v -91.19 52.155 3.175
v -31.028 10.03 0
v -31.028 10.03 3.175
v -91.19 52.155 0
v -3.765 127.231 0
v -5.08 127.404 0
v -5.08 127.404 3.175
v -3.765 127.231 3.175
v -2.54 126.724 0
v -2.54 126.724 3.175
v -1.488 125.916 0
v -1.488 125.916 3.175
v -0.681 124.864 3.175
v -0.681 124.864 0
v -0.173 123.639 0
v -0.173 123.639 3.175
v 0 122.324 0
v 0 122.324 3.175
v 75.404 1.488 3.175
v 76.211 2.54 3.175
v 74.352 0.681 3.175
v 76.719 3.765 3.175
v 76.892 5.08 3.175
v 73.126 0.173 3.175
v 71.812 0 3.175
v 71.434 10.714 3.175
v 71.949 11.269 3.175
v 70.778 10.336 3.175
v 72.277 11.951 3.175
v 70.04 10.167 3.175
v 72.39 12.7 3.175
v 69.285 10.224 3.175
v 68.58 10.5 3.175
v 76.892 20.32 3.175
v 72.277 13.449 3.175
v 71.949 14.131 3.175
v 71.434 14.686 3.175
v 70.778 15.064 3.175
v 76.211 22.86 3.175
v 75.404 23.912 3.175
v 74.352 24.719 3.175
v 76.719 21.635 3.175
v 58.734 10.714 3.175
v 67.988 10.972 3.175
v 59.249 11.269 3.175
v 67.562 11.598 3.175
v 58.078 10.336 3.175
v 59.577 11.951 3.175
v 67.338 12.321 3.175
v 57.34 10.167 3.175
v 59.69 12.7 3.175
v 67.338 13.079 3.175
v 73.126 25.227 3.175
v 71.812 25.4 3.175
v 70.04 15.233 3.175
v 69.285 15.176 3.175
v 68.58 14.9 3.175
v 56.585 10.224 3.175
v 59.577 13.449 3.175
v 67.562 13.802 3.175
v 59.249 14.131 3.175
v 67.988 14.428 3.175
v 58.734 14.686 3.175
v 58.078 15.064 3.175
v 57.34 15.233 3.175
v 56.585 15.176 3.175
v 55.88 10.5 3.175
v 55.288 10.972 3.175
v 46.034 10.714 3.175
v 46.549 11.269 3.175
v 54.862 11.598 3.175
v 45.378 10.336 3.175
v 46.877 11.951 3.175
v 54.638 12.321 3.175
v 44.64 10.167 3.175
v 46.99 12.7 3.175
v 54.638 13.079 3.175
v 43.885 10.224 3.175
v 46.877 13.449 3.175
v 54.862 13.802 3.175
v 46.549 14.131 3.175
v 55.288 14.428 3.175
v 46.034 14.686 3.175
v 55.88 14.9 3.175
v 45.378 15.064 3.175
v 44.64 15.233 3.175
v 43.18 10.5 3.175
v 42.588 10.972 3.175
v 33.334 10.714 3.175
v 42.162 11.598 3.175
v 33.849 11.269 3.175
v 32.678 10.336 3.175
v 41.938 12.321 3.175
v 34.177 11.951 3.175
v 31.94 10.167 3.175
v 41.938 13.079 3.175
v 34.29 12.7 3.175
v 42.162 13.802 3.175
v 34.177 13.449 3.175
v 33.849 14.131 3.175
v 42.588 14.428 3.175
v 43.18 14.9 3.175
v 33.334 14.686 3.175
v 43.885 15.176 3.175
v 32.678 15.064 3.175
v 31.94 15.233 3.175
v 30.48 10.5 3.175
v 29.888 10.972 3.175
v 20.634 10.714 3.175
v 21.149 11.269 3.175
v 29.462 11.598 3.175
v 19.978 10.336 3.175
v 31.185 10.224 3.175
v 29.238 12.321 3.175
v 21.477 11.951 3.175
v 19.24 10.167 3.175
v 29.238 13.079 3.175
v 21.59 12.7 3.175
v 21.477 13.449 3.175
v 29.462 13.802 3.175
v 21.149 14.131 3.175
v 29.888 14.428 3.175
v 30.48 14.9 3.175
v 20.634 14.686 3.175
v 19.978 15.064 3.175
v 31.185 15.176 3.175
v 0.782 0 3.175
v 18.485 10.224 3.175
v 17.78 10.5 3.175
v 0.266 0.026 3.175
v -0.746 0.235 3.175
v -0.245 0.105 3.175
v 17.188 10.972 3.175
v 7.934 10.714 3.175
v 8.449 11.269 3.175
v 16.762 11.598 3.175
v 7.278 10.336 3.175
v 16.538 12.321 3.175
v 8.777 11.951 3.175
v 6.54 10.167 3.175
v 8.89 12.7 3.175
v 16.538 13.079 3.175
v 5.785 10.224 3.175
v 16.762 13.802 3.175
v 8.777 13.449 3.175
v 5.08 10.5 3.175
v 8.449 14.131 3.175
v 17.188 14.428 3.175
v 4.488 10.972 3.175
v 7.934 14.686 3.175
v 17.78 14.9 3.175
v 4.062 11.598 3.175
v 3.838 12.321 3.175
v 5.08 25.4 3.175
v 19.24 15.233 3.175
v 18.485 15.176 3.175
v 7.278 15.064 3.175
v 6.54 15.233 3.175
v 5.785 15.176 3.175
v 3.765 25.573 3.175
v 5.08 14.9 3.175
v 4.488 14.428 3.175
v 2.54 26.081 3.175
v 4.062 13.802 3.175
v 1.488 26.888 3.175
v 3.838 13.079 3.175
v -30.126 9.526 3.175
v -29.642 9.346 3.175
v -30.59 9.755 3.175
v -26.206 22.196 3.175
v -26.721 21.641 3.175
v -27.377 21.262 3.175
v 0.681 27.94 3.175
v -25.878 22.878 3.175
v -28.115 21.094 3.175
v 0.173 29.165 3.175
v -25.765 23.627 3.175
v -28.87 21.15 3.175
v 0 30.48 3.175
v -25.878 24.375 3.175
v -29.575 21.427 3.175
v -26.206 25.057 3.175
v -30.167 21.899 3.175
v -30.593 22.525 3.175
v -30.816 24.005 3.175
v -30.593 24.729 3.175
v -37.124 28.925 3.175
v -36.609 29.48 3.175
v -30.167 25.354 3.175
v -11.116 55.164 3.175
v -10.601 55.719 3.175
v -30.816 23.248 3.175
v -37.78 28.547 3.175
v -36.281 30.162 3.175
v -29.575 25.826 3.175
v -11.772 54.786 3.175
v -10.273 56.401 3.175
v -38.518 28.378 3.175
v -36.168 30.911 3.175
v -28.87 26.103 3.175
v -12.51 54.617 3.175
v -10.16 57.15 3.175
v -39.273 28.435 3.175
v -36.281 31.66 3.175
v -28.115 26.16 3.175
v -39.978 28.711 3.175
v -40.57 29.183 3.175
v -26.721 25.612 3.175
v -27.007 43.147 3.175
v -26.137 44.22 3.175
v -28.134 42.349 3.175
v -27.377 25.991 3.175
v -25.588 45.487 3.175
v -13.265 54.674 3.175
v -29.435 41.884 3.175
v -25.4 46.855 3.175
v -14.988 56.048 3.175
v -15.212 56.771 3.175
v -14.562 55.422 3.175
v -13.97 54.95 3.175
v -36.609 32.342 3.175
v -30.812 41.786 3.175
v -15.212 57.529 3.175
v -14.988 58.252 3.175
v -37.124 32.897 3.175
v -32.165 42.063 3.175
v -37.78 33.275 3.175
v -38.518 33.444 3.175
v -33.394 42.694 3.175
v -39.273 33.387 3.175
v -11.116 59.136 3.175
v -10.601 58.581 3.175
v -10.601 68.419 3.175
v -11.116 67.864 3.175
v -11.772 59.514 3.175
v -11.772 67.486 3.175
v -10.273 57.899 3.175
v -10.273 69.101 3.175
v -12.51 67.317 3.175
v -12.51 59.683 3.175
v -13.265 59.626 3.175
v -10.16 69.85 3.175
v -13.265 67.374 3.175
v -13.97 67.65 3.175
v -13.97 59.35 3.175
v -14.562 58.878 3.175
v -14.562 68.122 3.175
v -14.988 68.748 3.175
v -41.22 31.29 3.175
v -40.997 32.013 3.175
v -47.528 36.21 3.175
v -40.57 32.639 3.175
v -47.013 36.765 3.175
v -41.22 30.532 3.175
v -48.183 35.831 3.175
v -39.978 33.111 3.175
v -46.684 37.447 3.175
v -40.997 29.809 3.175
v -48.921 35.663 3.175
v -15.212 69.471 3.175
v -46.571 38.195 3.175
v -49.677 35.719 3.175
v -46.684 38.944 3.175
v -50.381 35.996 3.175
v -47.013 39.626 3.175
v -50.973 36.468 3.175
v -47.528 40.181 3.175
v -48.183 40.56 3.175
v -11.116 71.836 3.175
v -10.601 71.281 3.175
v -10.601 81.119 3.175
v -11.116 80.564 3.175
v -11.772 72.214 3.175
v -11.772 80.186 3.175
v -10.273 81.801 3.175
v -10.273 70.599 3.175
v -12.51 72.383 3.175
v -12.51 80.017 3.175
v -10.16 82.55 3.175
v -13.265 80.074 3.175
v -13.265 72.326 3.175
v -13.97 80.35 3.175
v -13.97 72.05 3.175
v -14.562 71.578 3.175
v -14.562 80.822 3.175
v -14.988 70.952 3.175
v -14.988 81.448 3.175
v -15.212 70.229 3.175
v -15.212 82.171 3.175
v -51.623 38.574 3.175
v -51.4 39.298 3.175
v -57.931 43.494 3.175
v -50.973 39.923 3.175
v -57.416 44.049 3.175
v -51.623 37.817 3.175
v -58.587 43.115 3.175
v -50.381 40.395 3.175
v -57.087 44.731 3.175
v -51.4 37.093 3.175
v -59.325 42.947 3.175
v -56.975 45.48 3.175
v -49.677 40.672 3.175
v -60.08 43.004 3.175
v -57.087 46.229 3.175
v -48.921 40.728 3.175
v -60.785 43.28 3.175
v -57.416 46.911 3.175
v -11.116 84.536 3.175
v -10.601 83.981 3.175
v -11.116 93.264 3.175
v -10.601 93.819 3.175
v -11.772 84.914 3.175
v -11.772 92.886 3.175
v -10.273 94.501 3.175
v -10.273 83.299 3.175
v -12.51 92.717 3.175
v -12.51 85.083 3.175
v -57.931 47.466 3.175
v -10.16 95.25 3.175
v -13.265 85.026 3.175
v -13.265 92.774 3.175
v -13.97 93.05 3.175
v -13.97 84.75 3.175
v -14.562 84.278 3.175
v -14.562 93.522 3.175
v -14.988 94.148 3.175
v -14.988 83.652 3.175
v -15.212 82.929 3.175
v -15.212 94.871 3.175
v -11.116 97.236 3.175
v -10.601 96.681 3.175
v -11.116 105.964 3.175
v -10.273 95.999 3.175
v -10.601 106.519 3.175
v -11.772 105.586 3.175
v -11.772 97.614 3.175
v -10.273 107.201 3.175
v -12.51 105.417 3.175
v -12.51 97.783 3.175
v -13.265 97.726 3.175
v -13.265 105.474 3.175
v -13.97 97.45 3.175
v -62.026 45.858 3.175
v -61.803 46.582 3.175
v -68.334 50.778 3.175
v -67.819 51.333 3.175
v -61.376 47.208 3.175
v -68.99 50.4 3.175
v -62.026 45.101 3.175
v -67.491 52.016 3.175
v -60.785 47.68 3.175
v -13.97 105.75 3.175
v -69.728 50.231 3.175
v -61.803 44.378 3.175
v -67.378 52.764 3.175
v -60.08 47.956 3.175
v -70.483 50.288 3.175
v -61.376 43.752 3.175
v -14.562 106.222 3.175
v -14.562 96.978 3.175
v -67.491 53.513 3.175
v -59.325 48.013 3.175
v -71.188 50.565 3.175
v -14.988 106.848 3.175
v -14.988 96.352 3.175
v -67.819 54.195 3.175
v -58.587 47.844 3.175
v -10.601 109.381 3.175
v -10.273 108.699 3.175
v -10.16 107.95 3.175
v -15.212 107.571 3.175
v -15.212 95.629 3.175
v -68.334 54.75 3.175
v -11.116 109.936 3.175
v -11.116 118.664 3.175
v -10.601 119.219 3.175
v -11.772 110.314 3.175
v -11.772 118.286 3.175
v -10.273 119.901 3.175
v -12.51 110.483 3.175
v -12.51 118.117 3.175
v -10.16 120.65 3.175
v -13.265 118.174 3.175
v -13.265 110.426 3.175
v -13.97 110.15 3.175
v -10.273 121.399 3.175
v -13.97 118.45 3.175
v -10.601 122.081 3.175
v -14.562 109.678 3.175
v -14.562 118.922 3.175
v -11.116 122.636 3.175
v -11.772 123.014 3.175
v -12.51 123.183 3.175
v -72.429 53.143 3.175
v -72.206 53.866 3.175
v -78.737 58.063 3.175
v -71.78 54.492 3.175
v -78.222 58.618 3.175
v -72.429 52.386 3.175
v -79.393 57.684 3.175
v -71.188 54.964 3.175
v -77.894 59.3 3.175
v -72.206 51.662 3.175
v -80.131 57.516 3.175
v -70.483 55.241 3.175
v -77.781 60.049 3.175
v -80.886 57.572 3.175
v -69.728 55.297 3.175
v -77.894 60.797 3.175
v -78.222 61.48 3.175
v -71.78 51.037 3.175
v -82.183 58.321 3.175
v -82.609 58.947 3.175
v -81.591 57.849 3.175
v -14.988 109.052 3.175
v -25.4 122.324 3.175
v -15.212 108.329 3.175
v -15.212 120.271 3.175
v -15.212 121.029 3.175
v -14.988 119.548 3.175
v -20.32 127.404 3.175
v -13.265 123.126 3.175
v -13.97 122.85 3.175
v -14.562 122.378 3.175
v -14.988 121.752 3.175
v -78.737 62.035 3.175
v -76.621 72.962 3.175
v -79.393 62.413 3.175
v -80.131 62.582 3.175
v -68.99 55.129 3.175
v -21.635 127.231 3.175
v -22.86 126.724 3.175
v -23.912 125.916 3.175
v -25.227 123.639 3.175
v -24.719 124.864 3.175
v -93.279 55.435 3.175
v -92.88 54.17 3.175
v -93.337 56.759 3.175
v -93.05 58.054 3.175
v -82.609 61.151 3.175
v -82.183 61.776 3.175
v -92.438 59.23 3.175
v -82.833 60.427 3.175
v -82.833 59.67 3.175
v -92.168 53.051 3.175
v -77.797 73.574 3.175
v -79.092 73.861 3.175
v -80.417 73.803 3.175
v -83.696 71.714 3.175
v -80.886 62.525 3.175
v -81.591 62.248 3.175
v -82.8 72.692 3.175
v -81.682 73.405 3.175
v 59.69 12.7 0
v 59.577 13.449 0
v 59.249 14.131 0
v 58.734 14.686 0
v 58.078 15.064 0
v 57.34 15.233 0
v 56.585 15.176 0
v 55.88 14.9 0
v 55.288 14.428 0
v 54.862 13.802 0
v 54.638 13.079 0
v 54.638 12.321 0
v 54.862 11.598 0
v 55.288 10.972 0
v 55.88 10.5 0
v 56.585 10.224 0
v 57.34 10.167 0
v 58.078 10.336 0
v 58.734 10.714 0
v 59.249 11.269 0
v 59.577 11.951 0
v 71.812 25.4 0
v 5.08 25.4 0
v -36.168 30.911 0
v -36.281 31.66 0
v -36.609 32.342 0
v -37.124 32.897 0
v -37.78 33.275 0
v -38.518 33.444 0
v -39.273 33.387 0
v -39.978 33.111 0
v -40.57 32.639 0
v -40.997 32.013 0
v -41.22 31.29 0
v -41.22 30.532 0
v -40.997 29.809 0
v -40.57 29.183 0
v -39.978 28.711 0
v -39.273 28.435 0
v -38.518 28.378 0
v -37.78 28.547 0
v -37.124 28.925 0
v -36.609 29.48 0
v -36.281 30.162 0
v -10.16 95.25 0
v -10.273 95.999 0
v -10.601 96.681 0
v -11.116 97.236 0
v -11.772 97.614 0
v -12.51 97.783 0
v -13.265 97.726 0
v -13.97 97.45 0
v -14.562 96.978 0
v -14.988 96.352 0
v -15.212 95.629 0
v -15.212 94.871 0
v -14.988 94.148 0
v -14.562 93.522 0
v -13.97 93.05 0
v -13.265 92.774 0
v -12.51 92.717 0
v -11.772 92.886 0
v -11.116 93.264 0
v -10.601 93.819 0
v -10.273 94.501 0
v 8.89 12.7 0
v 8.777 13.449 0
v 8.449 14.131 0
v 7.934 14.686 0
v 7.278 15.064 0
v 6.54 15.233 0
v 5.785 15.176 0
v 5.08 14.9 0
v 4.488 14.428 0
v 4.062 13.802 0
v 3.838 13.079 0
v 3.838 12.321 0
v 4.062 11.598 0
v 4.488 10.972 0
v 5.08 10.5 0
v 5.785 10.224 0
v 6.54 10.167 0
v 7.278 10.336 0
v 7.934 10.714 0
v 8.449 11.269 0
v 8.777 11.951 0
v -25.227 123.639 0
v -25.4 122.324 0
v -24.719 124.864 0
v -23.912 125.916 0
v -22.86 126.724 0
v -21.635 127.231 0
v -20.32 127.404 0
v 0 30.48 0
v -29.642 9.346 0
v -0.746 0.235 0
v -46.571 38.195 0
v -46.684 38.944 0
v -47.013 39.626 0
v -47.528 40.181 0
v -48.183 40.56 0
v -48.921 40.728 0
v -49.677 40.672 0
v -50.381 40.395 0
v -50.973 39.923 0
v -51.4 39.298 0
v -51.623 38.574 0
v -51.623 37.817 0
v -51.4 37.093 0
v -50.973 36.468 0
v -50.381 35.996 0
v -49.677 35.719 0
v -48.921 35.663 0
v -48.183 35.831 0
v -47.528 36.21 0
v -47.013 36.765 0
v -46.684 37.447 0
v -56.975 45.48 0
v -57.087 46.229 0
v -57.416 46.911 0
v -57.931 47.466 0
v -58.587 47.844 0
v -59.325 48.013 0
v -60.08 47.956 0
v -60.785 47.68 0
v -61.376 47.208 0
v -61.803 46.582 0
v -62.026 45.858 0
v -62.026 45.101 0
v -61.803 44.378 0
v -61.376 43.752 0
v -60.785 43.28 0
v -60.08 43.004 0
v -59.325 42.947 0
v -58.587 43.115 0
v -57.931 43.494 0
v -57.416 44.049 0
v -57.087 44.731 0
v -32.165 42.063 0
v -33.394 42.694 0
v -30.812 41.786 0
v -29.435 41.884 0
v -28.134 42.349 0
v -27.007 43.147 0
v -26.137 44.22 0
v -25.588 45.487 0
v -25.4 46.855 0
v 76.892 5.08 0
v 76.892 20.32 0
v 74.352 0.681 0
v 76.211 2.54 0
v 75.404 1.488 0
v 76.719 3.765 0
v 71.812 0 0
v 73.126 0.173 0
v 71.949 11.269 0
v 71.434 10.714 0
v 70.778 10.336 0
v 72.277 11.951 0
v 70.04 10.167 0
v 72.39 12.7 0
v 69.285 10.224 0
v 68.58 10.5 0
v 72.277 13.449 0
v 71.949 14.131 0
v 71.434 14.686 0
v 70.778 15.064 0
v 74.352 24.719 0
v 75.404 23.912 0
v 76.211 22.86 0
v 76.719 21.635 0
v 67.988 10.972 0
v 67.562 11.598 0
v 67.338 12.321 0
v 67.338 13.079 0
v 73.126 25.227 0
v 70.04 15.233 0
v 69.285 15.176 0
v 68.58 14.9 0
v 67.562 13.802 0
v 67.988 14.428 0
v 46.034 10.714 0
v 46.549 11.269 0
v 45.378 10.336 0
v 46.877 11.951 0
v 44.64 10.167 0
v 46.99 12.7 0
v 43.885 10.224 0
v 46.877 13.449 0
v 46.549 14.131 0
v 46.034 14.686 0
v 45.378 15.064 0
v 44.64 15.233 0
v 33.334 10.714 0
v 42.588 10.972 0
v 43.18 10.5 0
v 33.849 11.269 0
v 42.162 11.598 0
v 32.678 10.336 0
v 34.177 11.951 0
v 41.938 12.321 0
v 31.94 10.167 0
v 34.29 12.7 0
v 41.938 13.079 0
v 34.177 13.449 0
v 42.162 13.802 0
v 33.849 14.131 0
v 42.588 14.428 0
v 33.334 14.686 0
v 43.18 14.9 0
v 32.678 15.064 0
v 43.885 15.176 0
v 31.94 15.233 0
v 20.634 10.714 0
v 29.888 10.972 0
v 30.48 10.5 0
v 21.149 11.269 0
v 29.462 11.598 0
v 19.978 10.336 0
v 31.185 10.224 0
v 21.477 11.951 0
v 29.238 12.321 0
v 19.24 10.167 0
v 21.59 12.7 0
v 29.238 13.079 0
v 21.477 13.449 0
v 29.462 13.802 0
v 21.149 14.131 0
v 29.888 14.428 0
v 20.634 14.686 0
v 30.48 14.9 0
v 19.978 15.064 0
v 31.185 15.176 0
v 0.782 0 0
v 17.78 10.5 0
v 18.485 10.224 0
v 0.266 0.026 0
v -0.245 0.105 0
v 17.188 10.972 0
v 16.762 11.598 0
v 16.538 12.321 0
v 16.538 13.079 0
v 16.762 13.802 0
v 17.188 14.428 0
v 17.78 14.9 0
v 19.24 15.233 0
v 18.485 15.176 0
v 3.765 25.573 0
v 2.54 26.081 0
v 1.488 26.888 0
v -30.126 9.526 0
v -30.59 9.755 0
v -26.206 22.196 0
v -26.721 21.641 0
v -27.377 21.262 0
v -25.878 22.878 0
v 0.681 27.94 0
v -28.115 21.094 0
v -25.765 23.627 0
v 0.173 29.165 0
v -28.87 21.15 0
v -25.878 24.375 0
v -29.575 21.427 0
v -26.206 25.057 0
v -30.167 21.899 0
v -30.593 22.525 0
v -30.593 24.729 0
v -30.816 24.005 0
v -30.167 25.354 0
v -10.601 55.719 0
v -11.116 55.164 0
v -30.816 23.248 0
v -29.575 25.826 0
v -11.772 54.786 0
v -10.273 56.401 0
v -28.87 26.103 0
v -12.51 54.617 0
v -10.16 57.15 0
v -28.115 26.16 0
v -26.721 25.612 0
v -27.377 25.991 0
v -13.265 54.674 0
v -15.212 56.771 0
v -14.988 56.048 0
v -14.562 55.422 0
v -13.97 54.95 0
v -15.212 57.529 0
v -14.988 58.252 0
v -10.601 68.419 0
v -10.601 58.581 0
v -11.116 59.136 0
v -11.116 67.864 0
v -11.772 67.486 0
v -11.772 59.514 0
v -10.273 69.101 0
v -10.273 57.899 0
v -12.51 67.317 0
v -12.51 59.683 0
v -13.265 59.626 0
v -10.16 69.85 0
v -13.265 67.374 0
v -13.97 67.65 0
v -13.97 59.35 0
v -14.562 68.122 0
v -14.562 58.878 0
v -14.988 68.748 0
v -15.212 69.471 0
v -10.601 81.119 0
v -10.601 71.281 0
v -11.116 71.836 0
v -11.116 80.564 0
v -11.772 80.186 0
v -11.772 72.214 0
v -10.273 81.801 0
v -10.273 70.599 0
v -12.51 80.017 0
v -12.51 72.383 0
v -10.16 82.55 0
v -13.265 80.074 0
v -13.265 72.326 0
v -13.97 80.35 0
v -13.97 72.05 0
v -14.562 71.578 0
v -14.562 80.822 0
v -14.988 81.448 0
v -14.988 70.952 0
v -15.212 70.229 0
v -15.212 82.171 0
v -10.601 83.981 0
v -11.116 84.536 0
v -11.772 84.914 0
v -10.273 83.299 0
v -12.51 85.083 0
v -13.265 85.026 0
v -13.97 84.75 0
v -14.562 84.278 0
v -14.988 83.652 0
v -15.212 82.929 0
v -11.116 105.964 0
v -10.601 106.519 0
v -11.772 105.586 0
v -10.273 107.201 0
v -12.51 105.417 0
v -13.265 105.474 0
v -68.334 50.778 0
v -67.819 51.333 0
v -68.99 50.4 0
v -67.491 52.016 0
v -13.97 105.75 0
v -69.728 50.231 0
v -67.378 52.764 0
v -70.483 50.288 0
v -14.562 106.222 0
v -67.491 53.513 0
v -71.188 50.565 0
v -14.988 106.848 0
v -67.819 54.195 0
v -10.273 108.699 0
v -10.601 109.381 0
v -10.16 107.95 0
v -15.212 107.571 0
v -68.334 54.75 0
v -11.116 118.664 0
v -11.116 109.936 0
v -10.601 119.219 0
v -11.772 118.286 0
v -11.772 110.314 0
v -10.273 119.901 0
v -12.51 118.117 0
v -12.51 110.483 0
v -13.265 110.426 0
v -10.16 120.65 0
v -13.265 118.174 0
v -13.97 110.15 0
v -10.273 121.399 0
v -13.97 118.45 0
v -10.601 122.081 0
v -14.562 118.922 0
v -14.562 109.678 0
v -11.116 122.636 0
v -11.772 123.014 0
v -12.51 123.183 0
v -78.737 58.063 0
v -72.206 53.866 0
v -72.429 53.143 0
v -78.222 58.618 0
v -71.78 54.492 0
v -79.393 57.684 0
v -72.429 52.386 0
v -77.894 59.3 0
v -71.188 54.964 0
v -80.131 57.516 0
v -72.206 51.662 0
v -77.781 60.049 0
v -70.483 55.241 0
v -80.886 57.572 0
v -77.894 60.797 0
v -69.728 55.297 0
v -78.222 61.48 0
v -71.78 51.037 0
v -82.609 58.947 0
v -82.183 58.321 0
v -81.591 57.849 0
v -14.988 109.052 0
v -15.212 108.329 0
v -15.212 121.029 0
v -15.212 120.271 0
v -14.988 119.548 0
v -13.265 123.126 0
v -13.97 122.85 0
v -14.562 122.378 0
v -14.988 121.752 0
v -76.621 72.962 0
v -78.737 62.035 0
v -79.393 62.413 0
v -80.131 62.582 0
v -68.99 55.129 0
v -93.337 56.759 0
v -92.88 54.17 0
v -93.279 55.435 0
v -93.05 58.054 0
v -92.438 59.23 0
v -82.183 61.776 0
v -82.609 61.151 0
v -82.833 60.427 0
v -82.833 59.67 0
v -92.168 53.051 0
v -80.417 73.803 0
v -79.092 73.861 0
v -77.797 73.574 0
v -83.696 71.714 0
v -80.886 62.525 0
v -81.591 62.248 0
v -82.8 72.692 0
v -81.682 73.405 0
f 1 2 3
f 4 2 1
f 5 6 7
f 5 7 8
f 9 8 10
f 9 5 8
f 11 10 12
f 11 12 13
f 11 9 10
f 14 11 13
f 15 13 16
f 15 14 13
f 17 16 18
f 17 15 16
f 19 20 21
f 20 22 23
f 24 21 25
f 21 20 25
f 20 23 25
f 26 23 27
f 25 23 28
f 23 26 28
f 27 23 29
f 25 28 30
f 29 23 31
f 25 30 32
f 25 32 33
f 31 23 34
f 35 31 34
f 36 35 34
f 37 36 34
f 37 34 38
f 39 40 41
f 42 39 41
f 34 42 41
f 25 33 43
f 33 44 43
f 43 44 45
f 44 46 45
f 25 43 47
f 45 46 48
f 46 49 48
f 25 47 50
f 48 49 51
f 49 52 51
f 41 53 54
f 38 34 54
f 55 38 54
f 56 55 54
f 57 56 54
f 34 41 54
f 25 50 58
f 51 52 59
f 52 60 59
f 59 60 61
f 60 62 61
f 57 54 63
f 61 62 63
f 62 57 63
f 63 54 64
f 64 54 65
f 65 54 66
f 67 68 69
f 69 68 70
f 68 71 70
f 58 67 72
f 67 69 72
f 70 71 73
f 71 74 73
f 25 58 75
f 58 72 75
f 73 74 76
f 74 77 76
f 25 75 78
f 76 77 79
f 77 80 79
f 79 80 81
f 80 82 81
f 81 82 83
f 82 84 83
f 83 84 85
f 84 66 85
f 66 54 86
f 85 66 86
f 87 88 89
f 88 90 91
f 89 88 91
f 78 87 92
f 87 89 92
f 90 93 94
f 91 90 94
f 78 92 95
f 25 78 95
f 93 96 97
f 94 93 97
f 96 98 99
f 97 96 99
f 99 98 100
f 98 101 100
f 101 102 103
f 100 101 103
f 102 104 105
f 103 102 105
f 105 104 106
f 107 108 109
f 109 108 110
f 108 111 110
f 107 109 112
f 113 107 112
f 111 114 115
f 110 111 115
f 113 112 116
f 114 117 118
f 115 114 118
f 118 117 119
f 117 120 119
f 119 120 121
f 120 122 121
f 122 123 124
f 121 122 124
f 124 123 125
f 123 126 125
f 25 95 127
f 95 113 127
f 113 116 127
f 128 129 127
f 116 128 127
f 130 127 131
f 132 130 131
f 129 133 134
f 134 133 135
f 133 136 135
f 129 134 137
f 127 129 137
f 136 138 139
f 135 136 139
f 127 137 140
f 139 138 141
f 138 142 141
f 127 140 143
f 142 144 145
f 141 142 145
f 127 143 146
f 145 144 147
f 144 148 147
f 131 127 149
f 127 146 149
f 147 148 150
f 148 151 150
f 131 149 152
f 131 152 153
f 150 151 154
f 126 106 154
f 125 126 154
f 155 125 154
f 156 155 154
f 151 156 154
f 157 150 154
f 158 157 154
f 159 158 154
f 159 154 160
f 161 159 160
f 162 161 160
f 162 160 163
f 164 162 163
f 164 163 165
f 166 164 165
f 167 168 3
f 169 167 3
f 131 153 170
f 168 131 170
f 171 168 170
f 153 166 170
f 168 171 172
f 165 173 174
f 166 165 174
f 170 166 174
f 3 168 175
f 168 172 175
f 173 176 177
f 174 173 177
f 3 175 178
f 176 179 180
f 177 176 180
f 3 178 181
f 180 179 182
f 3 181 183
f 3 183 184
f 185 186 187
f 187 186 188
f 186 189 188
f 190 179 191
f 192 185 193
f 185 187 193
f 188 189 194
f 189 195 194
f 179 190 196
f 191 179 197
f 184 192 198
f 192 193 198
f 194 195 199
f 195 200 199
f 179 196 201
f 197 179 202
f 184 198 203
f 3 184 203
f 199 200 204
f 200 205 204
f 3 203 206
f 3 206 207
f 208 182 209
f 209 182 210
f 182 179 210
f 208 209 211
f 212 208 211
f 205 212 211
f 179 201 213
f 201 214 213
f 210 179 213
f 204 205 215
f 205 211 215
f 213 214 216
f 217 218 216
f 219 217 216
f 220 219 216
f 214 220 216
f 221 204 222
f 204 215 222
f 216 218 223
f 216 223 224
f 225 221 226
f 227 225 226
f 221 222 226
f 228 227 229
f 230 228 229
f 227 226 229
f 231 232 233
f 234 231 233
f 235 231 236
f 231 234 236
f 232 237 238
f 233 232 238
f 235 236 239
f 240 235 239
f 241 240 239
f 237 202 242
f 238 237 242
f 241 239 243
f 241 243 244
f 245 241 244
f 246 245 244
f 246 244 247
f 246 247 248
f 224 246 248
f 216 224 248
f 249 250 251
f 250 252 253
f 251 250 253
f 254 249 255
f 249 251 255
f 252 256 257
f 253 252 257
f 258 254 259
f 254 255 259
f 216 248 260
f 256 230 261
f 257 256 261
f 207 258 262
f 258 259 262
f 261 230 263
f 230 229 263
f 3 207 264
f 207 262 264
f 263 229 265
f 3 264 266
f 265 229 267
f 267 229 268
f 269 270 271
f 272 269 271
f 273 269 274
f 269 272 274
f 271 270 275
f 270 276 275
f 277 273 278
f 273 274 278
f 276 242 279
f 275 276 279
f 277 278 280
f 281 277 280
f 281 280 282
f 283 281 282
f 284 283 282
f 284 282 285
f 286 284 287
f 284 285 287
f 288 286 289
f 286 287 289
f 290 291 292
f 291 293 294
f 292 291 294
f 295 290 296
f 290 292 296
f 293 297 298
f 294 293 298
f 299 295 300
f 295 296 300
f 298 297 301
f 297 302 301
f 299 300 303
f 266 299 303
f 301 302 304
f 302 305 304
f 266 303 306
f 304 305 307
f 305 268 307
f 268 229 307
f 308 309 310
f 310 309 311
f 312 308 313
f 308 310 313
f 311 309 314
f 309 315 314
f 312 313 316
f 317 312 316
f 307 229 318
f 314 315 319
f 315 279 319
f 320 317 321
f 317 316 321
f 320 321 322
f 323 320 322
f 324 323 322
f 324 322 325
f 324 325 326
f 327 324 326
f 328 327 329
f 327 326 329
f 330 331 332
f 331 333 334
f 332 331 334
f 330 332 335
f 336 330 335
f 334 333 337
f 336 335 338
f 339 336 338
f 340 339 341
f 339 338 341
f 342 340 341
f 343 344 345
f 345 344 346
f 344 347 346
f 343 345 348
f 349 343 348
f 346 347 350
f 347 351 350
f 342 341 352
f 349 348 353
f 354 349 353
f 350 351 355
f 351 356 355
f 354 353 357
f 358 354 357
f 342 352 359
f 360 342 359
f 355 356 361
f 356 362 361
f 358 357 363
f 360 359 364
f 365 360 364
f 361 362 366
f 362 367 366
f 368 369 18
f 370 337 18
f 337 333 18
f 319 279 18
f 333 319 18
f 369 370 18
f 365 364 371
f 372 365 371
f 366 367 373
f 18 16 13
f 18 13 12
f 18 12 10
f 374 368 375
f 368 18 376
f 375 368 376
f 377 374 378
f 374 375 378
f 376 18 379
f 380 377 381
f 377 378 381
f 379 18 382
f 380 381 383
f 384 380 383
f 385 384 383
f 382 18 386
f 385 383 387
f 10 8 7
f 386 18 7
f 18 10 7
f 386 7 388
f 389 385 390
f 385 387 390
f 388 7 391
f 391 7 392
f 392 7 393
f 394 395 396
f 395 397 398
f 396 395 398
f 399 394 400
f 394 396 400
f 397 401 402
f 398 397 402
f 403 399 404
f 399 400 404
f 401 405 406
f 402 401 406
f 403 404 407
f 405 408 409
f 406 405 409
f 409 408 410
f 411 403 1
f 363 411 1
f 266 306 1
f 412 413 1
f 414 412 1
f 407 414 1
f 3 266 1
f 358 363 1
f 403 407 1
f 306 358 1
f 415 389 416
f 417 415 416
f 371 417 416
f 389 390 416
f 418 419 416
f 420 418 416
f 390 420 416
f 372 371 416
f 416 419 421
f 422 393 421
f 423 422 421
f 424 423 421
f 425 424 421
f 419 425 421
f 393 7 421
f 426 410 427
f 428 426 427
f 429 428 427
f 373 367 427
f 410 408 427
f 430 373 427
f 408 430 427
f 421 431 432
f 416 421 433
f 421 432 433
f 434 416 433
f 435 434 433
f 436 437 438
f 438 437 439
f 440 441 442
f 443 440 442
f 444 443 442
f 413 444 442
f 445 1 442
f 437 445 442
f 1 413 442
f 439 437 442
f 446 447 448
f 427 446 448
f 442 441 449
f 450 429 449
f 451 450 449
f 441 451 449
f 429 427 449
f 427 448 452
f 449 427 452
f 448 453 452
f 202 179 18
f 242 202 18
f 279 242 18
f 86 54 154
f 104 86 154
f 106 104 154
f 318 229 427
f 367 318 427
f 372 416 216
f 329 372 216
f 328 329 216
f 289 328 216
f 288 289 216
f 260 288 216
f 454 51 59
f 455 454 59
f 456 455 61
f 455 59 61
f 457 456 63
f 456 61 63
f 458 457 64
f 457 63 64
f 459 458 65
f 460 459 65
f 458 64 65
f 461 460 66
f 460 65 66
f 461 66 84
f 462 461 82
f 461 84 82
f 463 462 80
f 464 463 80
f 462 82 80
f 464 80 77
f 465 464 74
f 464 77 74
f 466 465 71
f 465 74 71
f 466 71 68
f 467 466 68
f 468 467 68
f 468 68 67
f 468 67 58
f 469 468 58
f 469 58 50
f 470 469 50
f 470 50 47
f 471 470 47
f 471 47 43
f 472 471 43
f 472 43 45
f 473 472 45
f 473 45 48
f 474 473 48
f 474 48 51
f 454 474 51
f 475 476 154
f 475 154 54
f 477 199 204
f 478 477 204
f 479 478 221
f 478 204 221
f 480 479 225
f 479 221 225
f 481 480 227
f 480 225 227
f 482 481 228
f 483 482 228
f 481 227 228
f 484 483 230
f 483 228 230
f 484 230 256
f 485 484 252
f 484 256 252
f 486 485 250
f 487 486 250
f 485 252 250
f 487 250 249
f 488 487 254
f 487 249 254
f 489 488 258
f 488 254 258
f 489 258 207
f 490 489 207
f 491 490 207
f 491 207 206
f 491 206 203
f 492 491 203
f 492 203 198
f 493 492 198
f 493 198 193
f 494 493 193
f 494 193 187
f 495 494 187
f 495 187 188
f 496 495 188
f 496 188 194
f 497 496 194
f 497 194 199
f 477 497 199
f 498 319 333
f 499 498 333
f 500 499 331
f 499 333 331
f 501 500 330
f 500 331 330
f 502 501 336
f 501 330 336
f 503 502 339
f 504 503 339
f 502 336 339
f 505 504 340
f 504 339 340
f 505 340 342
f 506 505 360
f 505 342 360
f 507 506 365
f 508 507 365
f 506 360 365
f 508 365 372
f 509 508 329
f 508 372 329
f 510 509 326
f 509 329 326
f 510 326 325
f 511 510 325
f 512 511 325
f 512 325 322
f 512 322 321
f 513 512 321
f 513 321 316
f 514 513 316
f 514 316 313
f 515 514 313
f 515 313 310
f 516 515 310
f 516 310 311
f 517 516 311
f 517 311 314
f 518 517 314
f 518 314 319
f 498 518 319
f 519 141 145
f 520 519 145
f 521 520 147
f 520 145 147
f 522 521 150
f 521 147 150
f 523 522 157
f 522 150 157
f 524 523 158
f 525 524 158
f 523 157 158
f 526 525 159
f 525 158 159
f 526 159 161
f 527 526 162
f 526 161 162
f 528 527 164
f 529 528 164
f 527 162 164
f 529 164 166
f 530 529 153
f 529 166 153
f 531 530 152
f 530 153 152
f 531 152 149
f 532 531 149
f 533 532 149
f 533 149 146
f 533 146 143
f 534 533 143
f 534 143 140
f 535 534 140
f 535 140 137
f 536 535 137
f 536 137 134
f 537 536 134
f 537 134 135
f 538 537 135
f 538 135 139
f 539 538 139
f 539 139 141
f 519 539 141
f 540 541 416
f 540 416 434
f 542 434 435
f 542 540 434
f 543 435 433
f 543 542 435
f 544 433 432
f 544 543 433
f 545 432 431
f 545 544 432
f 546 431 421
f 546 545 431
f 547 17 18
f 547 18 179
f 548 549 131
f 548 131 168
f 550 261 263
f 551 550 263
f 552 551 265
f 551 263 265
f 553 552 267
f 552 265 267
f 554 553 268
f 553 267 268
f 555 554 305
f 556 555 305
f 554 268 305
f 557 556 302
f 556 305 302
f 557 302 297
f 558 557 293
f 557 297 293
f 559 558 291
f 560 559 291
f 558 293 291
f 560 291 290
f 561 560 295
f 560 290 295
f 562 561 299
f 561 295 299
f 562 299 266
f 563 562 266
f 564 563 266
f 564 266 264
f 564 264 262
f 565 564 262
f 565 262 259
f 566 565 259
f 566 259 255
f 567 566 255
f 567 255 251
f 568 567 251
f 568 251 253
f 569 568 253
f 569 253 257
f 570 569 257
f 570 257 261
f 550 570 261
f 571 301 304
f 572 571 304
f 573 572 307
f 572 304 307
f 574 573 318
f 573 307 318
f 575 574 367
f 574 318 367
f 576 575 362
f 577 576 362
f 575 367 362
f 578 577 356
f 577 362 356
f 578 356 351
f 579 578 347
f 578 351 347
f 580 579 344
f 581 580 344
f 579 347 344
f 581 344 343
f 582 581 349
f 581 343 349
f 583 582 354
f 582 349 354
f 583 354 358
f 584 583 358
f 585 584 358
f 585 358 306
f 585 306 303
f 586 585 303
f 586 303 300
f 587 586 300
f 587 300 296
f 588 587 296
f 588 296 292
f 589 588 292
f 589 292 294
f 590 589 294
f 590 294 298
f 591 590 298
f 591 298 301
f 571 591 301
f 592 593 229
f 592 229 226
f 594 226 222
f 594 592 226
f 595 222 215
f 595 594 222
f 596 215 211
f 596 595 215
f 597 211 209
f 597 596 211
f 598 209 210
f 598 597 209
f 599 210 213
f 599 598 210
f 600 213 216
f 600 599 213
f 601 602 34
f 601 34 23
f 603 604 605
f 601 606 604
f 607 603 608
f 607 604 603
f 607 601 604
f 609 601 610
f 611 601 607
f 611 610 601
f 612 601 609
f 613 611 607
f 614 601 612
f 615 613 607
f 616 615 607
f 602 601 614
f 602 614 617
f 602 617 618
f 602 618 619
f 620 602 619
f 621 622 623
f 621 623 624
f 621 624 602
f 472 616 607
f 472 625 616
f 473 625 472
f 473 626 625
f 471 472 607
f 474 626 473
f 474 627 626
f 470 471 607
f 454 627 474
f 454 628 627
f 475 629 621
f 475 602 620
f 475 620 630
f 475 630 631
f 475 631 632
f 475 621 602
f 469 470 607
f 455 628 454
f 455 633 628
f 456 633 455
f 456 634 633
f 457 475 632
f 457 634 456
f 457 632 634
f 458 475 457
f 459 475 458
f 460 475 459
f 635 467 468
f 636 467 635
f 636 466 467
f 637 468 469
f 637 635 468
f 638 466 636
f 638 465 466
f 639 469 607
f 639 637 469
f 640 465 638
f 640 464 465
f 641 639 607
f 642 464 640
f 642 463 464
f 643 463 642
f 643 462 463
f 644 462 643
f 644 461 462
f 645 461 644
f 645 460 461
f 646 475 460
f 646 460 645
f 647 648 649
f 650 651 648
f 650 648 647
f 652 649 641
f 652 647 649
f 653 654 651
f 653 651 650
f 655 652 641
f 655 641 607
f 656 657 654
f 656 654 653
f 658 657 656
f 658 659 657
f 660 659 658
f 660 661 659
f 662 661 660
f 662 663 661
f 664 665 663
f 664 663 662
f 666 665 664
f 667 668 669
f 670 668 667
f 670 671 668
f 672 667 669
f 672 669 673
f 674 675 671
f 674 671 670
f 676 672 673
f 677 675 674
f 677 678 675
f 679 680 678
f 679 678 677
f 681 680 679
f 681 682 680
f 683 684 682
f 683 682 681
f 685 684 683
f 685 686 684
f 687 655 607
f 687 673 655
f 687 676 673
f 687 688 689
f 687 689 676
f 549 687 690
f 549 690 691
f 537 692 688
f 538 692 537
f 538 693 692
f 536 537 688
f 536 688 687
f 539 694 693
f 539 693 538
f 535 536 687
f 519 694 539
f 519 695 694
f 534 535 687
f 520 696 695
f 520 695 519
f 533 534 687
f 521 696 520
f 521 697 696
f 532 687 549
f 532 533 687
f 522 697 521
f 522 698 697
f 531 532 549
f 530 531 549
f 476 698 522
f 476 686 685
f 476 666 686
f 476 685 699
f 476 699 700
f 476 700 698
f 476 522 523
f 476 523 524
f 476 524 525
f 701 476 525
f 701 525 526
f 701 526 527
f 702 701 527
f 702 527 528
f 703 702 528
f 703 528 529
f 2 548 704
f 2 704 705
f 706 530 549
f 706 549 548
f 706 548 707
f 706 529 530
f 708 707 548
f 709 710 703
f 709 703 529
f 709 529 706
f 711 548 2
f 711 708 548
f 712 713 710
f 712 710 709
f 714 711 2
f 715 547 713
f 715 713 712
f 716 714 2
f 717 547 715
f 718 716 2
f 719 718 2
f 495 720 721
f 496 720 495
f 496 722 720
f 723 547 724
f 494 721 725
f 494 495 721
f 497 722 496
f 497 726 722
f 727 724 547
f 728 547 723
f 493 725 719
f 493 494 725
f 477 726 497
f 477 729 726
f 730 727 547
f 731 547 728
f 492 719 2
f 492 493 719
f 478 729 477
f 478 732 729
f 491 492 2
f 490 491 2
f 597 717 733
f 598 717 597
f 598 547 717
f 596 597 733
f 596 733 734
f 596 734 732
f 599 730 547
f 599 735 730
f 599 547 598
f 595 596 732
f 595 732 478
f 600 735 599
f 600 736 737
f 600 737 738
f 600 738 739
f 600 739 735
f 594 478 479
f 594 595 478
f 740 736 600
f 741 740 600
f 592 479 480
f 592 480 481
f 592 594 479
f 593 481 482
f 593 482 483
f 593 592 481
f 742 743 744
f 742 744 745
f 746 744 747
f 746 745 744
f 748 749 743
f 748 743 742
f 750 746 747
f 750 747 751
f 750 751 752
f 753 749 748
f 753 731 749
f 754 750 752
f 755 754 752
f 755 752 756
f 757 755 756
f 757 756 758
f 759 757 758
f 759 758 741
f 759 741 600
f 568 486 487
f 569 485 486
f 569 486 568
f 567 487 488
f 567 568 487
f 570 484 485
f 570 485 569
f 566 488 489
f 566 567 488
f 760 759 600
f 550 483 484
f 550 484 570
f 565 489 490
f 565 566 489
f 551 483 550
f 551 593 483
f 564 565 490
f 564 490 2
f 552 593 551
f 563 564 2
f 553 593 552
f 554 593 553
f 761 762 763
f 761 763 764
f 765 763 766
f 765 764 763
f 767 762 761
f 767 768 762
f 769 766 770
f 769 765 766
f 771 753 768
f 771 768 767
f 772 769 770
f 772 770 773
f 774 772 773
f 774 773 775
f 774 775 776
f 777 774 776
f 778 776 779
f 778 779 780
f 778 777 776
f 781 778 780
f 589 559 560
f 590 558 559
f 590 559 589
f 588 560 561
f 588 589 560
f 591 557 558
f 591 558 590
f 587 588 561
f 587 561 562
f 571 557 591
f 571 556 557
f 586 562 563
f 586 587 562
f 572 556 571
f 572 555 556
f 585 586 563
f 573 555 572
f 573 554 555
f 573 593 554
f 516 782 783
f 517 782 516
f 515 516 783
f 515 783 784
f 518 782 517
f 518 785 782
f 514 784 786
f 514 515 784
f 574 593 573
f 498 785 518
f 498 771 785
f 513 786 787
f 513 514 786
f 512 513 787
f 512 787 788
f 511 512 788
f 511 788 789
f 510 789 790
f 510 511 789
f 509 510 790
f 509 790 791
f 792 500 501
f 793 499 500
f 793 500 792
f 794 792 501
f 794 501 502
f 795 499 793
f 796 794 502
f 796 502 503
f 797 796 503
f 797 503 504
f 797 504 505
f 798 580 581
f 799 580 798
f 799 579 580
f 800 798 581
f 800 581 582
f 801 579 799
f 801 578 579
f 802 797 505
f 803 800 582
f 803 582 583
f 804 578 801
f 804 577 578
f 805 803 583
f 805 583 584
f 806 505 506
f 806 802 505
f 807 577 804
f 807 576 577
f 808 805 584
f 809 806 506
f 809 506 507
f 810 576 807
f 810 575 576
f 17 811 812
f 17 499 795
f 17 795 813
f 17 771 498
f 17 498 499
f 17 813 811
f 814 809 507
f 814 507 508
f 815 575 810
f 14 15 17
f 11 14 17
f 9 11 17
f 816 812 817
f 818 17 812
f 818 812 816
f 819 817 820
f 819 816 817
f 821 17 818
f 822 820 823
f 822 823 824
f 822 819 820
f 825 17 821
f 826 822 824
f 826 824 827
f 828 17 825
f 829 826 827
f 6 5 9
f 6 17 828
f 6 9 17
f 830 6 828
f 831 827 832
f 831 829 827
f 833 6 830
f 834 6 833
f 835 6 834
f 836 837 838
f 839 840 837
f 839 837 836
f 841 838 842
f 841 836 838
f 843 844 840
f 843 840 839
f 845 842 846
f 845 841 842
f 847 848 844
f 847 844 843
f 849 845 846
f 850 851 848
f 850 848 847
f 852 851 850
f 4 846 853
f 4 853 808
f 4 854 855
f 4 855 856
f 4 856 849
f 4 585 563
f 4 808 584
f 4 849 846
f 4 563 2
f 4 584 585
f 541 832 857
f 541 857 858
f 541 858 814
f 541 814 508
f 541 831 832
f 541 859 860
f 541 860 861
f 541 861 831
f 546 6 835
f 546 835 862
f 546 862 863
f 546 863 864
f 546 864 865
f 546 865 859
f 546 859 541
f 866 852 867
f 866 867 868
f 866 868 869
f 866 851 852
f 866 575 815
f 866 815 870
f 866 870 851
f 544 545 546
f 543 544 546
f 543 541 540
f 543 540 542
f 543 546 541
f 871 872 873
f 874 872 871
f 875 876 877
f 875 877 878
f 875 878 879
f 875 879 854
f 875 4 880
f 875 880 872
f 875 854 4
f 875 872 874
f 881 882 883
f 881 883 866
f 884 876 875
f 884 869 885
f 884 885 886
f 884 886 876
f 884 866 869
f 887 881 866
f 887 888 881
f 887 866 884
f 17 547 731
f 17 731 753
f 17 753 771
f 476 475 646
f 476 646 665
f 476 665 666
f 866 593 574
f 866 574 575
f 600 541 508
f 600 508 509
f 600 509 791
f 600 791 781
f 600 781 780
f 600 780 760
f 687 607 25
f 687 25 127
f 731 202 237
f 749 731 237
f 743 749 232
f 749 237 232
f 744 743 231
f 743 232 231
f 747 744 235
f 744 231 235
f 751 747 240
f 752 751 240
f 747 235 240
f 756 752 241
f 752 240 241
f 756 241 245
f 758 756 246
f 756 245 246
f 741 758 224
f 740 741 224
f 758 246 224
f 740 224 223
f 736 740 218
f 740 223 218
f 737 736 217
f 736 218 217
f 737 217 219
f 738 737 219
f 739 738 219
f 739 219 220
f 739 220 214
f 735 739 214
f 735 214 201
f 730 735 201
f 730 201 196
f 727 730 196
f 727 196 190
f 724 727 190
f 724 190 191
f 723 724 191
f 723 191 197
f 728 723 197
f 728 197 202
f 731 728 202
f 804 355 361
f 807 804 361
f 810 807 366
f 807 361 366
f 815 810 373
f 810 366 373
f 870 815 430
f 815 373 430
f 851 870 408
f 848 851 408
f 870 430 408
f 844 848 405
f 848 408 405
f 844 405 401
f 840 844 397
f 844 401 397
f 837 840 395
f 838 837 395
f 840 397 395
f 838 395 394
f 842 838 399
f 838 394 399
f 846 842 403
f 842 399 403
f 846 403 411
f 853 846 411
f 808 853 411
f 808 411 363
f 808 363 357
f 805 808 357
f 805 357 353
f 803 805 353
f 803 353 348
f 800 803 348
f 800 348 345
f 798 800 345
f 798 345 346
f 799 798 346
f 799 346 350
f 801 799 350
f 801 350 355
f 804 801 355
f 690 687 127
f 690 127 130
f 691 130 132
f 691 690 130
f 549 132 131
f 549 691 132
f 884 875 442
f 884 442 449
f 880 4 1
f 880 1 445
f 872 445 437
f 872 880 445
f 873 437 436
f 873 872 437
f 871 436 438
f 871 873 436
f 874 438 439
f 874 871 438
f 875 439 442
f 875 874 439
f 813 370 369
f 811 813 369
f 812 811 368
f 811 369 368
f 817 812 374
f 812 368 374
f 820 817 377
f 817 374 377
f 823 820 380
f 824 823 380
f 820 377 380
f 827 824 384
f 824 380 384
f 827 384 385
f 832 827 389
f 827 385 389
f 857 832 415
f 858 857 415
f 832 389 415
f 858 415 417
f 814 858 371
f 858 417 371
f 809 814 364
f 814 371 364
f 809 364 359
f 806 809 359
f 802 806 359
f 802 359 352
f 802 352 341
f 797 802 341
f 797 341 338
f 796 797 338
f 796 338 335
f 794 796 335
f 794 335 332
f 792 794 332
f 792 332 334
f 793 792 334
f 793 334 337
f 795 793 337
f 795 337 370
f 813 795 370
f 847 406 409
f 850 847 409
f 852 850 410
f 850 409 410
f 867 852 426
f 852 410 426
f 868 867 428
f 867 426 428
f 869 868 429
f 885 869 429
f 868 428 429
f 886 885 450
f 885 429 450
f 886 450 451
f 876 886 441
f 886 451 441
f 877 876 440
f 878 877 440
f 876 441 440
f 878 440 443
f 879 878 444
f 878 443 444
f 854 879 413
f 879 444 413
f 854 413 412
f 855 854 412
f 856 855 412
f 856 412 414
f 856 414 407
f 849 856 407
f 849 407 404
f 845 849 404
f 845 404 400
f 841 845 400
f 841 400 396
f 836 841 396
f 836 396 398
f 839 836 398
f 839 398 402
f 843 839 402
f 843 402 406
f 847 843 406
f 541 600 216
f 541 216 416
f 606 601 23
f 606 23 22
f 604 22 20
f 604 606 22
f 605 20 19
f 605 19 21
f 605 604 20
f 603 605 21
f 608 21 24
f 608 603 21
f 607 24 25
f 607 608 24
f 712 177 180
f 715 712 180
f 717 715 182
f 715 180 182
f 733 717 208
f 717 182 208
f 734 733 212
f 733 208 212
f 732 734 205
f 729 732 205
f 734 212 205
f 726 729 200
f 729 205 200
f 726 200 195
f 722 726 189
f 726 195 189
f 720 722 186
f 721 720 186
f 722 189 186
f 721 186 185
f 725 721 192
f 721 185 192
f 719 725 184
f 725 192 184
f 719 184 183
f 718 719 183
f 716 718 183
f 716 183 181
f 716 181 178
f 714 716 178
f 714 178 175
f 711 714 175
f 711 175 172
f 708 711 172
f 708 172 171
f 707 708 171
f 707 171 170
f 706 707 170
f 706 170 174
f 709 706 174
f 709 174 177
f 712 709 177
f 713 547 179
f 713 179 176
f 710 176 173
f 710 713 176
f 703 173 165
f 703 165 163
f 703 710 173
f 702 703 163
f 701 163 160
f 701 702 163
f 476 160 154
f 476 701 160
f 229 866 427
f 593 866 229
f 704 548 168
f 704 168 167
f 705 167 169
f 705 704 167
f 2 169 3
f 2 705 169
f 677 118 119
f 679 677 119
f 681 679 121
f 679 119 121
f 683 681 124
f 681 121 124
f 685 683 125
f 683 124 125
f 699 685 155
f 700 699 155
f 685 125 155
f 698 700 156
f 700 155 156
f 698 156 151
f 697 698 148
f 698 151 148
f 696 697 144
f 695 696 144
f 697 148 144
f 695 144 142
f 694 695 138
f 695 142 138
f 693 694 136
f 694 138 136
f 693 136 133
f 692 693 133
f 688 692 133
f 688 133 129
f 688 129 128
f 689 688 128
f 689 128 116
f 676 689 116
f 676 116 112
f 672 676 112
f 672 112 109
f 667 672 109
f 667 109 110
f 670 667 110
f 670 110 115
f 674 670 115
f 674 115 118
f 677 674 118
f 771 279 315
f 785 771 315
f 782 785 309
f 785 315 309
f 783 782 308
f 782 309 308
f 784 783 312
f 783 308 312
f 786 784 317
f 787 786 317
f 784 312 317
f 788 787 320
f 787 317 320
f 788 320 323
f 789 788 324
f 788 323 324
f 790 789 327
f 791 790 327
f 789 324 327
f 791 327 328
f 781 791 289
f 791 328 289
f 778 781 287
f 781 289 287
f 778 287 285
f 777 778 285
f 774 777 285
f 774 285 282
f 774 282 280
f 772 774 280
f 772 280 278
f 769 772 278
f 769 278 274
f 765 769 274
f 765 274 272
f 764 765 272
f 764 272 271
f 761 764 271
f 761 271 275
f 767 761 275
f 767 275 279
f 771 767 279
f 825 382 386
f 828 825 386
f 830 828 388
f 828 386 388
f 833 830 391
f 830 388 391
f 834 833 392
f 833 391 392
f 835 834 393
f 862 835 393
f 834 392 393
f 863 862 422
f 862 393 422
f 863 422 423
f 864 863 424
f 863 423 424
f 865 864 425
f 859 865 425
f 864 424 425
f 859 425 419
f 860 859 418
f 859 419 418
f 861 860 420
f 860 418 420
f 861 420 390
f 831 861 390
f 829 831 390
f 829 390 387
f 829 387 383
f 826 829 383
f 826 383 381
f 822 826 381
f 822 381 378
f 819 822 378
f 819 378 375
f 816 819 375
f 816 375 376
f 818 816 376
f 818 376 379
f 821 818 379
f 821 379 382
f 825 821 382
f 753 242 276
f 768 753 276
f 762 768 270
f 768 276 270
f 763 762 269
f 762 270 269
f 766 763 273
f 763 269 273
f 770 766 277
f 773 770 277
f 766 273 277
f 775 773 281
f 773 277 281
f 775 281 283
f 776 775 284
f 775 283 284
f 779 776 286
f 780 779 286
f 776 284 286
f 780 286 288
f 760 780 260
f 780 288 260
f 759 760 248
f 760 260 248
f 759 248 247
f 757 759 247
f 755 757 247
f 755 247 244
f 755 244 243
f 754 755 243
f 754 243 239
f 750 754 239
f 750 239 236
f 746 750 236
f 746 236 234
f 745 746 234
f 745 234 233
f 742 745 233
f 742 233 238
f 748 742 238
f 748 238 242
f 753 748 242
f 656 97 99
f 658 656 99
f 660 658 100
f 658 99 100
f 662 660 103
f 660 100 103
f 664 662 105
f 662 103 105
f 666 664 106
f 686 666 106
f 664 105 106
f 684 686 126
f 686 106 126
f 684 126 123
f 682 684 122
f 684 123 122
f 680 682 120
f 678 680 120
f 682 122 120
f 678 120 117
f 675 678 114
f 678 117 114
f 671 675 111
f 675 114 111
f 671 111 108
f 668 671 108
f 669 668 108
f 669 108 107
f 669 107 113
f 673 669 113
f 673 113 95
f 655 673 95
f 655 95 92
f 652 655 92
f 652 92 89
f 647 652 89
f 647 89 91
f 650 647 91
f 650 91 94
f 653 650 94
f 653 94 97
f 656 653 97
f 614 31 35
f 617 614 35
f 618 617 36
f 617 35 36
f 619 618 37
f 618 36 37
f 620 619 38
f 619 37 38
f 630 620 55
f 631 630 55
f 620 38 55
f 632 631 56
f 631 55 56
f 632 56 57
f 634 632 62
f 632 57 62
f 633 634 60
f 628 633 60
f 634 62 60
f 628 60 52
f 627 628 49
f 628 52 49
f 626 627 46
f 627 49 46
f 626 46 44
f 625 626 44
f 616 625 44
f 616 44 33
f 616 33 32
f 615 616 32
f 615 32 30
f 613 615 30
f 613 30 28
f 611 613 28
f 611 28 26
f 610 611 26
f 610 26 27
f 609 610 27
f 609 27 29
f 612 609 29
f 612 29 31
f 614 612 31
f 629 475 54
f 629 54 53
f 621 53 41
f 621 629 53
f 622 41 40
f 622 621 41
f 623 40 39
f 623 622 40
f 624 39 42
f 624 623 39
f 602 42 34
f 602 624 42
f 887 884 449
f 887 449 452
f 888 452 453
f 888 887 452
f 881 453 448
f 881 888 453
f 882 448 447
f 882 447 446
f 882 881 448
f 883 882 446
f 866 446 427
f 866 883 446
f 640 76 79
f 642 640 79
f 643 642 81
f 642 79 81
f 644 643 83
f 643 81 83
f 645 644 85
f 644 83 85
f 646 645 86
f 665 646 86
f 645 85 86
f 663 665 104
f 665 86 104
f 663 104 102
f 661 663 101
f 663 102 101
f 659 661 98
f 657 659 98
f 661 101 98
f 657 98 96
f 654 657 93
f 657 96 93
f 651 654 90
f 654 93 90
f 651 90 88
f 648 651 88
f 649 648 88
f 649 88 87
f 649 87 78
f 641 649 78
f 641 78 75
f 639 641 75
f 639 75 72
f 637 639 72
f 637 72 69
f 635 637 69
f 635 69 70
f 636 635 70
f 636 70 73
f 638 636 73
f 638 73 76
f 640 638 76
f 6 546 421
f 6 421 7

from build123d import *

# Parameters (mm, degrees)
BOSS_EXTRUDE1_DEPTH     = 3.175
CUT_EXTRUDE5_START      = 3.175
SKETCH3_R               = 2.54
CUT_EXTRUDE5_DEPTH      = 4.175
CUT_EXTRUDE5_DEPTH_BACK = 4.175


with BuildPart() as part:
    # Sketch2 → Boss-Extrude1 (new body)
    with BuildSketch(Plane.XY):
        with BuildLine():
            Line((-20.32, 127.404287689), (-5.08, 127.404287689))
            ThreePointArc((-5.08, 127.404287689), (-1.487897552, 125.916390137), (0, 122.324287689))
            Line((0, 122.324287689), (0, 50.8))
            Line((0, 50.8), (0, 30.48))
            ThreePointArc((0, 30.48), (1.487897552, 26.887897552), (5.08, 25.4))
            Line((5.08, 25.4), (71.811597359, 25.4))
            ThreePointArc((71.811597359, 25.4), (75.403699807, 23.912102448), (76.891597359, 20.32))
            Line((76.891597359, 20.32), (76.891597359, 5.08))
            ThreePointArc((76.891597359, 5.08), (75.403699807, 1.487897552), (71.811597359, 0))
            Line((71.811597359, 0), (0.781886783, 0))
            ThreePointArc((0.781886783, 0), (0.009099981, 0.059123527), (-0.745698678, 0.23511789))
            Line((-0.745698678, 0.23511789), (-29.641953026, 9.346071889))
            ThreePointArc((-29.641953026, 9.346071889), (-30.36119411, 9.634840472), (-31.028135861, 10.029661614))
            Line((-31.028135861, 10.029661614), (-91.189980426, 52.155438691))
            ThreePointArc((-91.189980426, 52.155438691), (-93.279035515, 55.434598334), (-92.437504515, 59.230499373))
            Line((-92.437504515, 59.230499373), (-83.696199625, 71.714376528))
            ThreePointArc((-83.696199625, 71.714376528), (-80.417039982, 73.803431616), (-76.621138943, 72.961900616))
            Line((-76.621138943, 72.961900616), (-33.393768297, 42.693769833))
            ThreePointArc((-33.393768297, 42.693769833), (-28.134317045, 42.349047185), (-25.4, 46.855062218))
            Line((-25.4, 46.855062218), (-25.4, 122.324287689))
            ThreePointArc((-25.4, 122.324287689), (-23.912102448, 125.916390137), (-20.32, 127.404287689))
        make_face()
    extrude(amount=BOSS_EXTRUDE1_DEPTH)

    # Sketch3 → Cut-Extrude5 (cut, two sides)
    with BuildSketch(Plane.XY.offset(CUT_EXTRUDE5_START)) as cut_extrude5_sk:
        with Locations((-12.7, 57.15)):
            Circle(SKETCH3_R)
        with Locations((6.35, 12.7)):
            Circle(SKETCH3_R)
        with Locations((-28.304846444, 23.626631112)):
            Circle(SKETCH3_R)
        with Locations((-38.708077406, 30.911051854)):
            Circle(SKETCH3_R)
        with Locations((-49.111308369, 38.195472596)):
            Circle(SKETCH3_R)
        with Locations((-59.514539331, 45.479893337)):
            Circle(SKETCH3_R)
        with Locations((-69.917770294, 52.764314079)):
            Circle(SKETCH3_R)
        with Locations((-80.321001256, 60.048734821)):
            Circle(SKETCH3_R)
        with Locations((-12.7, 69.85)):
            Circle(SKETCH3_R)
        with Locations((-12.7, 82.55)):
            Circle(SKETCH3_R)
        with Locations((-12.7, 95.25)):
            Circle(SKETCH3_R)
        with Locations((-12.7, 107.95)):
            Circle(SKETCH3_R)
        with Locations((-12.7, 120.65)):
            Circle(SKETCH3_R)
        with Locations((19.05, 12.7)):
            Circle(SKETCH3_R)
        with Locations((31.75, 12.7)):
            Circle(SKETCH3_R)
        with Locations((44.45, 12.7)):
            Circle(SKETCH3_R)
        with Locations((57.15, 12.7)):
            Circle(SKETCH3_R)
        with Locations((69.85, 12.7)):
            Circle(SKETCH3_R)
    extrude(amount=CUT_EXTRUDE5_DEPTH, mode=Mode.SUBTRACT)
    extrude(cut_extrude5_sk.sketch, amount=-CUT_EXTRUDE5_DEPTH_BACK, mode=Mode.SUBTRACT)


solid = part.part
